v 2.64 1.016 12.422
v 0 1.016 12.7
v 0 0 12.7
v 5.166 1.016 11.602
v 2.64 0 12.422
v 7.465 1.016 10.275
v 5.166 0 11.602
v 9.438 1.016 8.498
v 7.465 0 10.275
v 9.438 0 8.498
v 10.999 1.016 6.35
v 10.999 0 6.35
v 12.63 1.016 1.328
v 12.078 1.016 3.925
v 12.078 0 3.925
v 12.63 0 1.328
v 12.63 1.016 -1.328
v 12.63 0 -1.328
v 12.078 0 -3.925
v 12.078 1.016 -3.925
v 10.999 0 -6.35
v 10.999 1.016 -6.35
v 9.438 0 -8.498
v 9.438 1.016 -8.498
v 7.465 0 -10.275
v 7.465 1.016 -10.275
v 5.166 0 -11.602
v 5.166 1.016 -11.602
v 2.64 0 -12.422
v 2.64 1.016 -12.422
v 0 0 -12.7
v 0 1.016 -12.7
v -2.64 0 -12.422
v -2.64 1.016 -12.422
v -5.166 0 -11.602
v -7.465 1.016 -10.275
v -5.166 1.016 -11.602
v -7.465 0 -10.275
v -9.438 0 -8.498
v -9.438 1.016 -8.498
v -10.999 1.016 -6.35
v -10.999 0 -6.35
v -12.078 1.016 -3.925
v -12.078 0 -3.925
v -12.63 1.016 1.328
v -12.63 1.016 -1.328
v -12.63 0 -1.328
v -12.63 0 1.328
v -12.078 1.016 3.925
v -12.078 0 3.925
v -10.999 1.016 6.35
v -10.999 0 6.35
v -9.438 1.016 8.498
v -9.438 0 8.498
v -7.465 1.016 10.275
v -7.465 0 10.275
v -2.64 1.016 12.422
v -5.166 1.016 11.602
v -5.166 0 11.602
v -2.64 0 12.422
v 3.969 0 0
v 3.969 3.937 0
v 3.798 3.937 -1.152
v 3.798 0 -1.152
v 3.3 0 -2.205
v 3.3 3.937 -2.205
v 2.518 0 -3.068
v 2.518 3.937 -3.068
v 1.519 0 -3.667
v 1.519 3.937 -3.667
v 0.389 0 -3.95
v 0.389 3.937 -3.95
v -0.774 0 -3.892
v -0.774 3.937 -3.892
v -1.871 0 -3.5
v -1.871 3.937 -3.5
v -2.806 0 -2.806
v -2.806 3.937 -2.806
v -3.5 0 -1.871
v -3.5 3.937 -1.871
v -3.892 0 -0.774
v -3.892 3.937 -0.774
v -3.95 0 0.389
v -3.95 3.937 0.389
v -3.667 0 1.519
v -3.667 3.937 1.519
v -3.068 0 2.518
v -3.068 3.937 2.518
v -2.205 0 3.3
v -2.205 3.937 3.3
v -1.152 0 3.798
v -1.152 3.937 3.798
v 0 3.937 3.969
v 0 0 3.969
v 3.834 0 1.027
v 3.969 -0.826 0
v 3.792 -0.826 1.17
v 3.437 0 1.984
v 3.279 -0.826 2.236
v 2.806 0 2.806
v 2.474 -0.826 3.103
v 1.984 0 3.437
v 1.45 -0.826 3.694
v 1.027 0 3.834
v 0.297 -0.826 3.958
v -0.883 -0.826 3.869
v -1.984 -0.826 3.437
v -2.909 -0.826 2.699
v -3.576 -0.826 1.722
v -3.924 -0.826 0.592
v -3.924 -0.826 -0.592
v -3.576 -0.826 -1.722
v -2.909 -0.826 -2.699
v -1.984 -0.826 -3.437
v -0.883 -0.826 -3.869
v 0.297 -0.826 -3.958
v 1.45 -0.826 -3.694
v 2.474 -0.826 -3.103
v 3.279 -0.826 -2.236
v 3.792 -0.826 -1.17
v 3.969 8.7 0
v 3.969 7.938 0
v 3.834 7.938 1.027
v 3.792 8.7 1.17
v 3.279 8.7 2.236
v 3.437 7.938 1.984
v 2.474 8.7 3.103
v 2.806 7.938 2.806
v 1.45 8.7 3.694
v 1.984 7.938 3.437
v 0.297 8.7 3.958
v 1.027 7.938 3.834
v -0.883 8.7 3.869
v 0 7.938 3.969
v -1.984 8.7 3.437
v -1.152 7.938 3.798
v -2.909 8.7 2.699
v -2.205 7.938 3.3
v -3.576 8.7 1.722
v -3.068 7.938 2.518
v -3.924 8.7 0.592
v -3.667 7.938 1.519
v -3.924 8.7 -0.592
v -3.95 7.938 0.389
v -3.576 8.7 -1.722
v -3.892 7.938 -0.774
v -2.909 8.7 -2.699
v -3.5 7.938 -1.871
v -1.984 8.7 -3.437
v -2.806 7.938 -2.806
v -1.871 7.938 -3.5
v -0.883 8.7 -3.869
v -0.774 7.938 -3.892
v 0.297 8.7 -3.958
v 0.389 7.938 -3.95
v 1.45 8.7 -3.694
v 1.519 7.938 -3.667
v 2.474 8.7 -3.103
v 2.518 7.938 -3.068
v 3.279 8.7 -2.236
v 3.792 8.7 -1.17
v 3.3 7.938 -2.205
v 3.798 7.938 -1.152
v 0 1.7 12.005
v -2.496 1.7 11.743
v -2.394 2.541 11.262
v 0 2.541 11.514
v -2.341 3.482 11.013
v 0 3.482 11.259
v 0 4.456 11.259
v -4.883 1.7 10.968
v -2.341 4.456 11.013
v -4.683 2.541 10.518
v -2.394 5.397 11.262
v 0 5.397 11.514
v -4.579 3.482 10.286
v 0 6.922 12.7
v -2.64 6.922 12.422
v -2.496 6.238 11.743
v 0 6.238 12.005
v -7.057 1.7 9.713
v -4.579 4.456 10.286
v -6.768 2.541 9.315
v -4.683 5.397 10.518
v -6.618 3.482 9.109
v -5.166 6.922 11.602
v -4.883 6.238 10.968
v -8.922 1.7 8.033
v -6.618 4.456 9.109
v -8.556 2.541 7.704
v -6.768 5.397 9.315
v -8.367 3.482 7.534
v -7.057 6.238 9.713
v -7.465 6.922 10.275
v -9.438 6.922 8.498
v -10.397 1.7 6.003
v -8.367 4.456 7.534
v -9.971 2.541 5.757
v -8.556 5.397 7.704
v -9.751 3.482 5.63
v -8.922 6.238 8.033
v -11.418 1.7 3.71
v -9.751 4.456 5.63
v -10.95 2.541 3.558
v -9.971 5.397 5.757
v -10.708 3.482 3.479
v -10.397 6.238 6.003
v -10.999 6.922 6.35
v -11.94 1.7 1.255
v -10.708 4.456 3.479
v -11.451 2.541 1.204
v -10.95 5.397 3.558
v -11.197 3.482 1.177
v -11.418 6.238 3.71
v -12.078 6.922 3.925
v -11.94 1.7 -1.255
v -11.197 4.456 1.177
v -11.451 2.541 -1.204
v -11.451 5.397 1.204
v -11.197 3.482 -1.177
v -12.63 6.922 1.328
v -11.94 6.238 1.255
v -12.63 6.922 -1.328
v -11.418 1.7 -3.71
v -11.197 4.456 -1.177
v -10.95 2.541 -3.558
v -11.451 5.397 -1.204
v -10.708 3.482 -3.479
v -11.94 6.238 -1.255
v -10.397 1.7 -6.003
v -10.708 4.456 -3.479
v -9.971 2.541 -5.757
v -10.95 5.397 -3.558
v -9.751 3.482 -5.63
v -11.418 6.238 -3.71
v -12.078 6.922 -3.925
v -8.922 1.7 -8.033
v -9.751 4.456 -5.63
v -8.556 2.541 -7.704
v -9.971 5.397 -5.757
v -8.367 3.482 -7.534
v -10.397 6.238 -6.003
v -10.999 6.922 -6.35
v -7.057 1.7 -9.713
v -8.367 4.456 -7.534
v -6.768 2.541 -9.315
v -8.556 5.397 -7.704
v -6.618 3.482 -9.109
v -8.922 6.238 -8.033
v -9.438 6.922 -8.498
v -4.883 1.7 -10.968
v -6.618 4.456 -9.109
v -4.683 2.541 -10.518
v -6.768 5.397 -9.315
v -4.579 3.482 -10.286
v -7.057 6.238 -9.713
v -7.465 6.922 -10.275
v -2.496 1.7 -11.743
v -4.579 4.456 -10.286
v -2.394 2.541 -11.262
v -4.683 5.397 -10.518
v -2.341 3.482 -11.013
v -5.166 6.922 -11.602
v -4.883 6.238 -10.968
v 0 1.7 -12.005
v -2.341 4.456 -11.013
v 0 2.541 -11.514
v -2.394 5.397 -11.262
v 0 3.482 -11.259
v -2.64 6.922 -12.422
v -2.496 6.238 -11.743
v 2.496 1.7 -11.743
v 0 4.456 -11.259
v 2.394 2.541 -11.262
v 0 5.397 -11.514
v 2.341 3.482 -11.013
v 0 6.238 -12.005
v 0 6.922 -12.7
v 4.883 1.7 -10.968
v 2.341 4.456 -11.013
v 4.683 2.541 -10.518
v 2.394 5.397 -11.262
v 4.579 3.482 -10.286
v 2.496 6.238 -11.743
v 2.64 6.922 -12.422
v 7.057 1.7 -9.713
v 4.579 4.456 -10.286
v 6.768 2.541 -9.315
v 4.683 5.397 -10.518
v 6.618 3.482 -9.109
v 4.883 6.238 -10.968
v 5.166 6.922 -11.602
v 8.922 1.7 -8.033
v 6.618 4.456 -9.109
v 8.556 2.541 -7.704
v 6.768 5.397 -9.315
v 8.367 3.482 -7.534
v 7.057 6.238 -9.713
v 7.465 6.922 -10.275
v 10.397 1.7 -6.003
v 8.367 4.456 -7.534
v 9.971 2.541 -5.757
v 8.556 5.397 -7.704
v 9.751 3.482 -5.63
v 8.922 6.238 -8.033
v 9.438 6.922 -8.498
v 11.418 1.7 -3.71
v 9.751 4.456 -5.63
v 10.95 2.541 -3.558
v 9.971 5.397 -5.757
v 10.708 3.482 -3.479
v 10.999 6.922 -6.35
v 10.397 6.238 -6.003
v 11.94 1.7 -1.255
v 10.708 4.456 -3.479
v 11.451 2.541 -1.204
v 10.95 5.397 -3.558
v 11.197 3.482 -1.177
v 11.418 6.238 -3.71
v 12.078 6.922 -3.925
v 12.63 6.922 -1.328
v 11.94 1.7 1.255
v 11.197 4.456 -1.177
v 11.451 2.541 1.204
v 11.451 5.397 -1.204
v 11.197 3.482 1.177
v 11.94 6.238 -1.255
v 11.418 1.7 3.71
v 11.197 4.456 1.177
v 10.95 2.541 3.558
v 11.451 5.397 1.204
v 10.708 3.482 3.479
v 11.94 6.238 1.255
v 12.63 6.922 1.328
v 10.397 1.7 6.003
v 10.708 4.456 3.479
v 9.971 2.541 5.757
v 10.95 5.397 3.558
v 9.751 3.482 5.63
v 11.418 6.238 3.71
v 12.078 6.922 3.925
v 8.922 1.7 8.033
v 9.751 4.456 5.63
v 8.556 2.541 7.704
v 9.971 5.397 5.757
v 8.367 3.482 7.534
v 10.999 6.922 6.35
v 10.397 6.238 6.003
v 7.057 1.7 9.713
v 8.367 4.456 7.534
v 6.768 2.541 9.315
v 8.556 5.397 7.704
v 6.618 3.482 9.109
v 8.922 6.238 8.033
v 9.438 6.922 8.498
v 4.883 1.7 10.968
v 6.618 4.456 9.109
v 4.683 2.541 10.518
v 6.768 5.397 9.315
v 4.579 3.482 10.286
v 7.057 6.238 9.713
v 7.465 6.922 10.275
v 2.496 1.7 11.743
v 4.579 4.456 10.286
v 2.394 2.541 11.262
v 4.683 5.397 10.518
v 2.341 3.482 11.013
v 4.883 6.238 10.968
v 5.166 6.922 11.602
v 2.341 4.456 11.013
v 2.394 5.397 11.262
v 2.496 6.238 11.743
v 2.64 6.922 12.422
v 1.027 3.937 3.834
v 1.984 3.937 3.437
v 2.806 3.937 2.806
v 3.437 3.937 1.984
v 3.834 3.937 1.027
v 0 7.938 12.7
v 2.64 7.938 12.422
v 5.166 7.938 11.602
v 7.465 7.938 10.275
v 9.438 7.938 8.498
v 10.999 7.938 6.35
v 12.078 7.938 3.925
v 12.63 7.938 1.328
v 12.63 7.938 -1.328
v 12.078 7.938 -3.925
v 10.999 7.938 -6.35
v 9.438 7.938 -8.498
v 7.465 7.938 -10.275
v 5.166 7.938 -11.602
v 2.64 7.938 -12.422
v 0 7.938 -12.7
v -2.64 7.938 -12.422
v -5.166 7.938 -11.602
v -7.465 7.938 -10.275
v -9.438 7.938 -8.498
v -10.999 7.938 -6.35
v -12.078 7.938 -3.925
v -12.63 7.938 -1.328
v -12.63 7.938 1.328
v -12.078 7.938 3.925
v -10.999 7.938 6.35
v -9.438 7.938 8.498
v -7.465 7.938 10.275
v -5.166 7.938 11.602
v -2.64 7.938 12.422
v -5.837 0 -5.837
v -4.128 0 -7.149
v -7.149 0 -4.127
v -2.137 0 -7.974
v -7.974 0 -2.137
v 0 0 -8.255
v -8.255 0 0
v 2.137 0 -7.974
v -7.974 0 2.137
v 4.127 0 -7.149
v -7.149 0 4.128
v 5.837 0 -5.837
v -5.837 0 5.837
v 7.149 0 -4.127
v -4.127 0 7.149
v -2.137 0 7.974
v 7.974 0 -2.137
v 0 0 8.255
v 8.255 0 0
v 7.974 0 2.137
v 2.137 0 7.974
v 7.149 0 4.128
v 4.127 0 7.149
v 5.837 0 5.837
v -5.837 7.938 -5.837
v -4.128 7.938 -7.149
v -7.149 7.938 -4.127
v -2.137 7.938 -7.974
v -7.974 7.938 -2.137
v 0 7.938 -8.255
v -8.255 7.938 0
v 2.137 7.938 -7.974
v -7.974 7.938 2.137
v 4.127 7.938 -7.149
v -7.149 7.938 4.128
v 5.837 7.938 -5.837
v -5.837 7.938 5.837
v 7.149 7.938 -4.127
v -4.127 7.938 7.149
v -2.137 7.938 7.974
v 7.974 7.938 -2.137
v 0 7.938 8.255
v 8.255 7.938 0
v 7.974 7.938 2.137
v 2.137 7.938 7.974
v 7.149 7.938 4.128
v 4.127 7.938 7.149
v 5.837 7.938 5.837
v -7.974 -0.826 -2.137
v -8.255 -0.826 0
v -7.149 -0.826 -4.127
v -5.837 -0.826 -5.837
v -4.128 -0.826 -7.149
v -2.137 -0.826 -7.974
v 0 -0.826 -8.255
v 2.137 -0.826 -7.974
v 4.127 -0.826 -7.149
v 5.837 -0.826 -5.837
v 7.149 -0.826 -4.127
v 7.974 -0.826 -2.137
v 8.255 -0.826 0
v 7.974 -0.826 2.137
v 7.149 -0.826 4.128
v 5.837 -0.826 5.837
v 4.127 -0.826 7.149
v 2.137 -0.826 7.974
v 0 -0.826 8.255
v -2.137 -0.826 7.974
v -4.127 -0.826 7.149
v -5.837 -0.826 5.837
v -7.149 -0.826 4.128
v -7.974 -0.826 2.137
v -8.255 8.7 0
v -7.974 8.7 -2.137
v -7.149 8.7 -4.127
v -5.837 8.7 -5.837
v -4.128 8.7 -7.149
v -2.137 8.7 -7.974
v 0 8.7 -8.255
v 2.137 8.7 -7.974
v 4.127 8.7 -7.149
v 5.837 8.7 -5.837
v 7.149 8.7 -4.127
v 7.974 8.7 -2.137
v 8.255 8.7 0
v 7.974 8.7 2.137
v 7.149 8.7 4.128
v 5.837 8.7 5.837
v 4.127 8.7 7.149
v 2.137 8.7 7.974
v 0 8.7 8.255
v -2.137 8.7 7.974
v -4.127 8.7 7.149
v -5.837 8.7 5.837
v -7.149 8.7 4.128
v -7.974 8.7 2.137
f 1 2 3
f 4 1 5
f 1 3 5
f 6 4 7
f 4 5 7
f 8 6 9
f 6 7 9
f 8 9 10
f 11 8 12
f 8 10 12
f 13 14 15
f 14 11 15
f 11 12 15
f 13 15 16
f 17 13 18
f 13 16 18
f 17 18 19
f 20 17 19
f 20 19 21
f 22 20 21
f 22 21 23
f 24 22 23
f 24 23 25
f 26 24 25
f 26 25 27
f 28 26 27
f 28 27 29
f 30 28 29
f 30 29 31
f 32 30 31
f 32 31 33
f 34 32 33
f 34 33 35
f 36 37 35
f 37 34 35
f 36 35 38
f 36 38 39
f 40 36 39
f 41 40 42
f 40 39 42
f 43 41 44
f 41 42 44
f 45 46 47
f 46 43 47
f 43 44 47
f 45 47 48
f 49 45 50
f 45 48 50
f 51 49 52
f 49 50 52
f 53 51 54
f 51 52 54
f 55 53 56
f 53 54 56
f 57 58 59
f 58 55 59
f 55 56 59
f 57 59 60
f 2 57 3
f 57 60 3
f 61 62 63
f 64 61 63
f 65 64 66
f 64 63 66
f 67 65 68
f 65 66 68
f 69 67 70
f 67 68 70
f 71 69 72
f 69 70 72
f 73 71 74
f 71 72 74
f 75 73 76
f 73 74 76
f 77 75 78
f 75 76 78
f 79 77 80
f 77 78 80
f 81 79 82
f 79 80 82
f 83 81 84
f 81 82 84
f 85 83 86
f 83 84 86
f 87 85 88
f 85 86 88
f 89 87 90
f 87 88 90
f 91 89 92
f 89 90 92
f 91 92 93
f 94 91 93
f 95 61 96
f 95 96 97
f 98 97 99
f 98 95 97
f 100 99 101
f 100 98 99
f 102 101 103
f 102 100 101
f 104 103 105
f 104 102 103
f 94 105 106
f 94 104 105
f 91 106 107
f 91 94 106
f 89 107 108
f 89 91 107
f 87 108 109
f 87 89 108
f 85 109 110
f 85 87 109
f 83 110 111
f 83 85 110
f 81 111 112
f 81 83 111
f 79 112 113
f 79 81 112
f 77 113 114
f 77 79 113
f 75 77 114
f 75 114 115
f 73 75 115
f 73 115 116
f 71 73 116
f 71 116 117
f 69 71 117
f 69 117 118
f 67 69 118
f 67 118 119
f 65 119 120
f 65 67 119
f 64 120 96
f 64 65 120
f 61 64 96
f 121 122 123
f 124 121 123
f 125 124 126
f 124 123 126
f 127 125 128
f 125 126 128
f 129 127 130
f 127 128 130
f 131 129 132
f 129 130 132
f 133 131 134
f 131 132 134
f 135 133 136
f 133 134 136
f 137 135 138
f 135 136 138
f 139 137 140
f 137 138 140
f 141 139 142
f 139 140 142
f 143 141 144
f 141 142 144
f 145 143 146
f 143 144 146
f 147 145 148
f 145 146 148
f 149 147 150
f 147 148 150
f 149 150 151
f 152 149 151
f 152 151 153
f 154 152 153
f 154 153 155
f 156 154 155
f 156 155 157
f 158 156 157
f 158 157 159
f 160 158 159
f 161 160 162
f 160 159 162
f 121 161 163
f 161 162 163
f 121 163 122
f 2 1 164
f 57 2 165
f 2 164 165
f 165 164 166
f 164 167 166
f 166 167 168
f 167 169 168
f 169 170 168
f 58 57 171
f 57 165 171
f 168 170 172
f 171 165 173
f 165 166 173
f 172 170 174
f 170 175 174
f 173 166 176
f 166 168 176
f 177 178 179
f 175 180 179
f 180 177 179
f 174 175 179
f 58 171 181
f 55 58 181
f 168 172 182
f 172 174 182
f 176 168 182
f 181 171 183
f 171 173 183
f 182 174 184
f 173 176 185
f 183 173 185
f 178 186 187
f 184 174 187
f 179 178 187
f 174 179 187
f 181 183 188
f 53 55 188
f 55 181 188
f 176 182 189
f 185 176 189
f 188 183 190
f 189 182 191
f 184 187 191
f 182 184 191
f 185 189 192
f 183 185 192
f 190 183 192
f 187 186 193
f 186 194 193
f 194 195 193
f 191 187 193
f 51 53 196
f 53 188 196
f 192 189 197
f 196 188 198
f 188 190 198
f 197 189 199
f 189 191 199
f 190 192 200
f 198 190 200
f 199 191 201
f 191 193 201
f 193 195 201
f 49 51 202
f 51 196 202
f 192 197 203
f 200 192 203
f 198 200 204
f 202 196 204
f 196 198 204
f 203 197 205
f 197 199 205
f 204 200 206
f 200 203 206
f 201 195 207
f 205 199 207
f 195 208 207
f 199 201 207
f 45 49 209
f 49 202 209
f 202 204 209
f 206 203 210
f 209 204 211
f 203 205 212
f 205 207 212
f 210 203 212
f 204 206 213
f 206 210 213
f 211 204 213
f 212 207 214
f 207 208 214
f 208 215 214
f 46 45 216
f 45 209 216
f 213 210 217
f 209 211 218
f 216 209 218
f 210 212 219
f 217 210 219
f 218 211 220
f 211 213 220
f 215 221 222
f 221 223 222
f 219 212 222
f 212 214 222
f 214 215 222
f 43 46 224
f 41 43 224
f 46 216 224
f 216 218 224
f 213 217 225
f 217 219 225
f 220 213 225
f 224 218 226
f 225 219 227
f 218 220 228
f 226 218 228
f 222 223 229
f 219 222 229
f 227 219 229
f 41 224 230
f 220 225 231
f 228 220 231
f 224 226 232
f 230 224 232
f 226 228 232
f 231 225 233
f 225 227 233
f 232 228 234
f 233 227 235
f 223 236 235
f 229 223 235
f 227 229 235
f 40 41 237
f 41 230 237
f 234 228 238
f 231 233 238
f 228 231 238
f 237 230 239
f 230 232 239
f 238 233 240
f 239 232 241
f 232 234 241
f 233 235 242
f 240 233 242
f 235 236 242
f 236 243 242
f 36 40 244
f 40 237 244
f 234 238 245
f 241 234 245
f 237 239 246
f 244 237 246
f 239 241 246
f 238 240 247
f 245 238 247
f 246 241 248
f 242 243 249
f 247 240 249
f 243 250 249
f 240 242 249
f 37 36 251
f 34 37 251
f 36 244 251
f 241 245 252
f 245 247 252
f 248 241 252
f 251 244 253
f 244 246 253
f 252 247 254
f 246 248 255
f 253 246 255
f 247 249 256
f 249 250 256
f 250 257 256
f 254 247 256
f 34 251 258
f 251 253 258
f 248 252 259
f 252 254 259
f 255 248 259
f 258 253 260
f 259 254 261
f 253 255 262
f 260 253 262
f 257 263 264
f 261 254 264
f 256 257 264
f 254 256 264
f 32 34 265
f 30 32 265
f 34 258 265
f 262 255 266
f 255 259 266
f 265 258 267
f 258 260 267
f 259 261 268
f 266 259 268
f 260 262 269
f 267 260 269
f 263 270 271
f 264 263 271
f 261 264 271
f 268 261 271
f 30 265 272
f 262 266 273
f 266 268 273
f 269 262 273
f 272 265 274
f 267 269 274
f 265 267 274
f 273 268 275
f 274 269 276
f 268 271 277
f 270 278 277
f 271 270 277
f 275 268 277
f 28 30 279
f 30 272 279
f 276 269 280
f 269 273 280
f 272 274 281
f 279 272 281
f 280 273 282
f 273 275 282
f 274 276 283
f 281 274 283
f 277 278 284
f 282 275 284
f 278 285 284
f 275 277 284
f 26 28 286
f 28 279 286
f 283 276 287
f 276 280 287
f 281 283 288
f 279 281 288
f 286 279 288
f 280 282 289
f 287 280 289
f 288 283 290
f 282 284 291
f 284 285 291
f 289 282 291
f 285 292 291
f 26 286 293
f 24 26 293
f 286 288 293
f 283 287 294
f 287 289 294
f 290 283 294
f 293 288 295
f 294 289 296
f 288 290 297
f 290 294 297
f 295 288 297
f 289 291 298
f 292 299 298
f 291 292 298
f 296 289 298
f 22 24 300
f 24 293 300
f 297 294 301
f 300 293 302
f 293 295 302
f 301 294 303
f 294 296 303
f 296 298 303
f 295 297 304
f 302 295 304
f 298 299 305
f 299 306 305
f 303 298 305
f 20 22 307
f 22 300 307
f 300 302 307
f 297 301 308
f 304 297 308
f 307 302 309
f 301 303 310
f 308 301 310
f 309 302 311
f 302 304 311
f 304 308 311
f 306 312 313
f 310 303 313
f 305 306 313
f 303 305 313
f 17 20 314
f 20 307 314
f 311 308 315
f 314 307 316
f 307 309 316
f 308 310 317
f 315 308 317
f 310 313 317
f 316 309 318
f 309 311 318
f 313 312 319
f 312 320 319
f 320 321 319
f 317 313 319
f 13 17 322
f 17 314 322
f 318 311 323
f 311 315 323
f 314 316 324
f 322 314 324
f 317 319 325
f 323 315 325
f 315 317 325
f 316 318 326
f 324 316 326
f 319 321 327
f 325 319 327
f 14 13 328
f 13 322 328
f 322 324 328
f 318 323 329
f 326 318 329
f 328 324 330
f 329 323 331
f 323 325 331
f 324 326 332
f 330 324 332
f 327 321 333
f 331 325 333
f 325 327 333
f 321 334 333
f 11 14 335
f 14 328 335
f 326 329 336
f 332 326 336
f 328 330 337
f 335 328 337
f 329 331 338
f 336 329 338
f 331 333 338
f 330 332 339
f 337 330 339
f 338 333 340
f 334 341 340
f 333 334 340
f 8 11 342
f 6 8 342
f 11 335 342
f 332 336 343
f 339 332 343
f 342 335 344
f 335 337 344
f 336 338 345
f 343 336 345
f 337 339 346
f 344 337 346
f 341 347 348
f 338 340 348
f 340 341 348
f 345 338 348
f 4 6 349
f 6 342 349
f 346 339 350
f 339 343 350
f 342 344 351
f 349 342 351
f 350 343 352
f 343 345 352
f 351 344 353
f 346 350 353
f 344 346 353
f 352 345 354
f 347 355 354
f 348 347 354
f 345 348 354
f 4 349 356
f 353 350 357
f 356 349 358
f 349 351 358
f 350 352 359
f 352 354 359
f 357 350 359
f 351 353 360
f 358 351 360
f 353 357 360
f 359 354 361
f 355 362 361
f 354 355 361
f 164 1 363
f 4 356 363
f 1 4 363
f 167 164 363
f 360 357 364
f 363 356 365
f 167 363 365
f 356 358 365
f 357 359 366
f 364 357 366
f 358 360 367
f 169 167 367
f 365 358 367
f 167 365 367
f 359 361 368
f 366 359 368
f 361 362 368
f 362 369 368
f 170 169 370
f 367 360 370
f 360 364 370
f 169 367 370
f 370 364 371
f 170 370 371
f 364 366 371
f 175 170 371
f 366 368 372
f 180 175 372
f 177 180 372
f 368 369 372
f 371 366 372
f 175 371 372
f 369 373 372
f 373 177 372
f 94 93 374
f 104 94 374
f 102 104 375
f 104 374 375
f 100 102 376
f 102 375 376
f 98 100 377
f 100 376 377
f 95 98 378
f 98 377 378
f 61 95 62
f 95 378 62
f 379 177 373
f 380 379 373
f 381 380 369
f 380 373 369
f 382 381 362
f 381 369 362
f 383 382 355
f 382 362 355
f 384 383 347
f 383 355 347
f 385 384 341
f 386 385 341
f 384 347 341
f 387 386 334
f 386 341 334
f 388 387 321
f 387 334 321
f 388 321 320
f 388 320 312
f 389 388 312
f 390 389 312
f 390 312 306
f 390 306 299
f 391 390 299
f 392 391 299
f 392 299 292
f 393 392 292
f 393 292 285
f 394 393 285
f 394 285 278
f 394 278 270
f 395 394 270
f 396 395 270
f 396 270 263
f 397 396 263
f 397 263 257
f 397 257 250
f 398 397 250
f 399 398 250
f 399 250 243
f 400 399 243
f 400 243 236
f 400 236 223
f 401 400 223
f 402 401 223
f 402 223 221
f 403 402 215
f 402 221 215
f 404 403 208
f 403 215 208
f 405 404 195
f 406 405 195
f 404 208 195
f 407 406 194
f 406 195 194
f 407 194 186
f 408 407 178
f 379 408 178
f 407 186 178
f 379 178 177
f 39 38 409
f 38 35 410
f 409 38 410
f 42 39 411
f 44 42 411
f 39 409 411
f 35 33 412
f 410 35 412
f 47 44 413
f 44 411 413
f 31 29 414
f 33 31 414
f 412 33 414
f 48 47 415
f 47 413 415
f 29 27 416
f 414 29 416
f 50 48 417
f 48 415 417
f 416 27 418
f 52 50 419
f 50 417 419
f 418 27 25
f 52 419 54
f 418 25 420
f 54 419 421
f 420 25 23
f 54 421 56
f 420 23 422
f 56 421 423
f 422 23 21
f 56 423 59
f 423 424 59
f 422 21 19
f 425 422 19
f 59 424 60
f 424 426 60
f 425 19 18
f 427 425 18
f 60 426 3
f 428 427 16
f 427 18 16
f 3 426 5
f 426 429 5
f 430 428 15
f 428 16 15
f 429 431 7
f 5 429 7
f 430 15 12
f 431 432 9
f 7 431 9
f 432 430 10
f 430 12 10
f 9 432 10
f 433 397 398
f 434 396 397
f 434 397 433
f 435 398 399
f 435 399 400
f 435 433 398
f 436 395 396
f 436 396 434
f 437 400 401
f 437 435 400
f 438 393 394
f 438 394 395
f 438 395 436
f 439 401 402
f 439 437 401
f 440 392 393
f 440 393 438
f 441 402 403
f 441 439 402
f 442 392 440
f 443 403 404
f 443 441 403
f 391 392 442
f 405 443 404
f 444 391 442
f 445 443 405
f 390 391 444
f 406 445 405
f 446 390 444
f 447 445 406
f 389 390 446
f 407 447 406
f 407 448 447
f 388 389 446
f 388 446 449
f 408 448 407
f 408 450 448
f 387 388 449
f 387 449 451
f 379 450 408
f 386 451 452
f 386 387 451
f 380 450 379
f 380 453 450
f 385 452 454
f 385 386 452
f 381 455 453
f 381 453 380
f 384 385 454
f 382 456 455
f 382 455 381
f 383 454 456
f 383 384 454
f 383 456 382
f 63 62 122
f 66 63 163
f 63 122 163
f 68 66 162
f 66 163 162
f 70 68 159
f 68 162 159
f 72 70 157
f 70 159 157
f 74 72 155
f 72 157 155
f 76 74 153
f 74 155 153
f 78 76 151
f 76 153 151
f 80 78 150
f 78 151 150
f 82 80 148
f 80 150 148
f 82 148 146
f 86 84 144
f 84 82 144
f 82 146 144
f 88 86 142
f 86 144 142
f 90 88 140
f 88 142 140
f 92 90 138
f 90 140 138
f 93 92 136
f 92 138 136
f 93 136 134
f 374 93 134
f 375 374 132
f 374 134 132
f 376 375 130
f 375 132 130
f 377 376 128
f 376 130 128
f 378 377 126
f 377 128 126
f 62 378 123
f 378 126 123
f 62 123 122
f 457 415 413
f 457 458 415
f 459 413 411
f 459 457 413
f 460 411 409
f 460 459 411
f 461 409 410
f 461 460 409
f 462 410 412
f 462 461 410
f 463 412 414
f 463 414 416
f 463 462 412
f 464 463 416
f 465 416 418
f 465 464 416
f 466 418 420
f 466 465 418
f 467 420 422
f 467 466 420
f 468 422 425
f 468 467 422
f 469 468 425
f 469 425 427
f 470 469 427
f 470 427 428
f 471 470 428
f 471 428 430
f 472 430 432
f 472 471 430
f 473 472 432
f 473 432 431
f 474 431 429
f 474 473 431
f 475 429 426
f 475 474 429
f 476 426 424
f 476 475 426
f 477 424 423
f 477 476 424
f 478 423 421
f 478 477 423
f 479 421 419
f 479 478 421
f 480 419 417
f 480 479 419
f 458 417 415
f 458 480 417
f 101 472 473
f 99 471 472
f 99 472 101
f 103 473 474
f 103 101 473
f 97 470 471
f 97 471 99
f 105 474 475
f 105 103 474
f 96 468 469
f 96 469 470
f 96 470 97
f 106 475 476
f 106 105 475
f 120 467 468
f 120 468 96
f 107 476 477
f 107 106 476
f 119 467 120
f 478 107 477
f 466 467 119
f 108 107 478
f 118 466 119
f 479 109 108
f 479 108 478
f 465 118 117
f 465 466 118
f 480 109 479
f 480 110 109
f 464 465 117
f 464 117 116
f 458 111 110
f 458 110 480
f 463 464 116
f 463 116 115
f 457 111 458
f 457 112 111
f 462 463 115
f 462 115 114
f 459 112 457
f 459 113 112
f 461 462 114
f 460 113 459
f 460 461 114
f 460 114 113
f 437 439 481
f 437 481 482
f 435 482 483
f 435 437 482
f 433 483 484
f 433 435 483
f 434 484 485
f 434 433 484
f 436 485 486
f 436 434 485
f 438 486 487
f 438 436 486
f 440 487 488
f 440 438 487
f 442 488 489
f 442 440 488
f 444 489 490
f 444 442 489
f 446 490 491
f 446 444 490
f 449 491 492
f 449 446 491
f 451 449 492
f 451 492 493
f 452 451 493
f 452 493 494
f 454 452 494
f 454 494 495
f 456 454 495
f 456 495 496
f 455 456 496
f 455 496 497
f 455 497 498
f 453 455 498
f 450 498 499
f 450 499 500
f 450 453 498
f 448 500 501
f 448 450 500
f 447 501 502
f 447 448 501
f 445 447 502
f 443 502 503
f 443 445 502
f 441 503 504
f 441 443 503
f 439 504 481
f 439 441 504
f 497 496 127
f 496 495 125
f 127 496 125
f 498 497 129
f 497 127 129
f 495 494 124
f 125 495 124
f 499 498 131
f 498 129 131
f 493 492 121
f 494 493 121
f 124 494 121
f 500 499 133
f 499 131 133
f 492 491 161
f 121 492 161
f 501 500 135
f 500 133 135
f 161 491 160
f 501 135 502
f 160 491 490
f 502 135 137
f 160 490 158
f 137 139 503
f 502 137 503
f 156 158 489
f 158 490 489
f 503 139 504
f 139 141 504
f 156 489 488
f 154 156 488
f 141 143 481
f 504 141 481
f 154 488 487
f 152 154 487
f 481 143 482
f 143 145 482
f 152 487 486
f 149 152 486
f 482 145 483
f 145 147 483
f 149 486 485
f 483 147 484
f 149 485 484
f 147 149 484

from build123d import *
from build123d.topology import SkipClean

# Parameters (mm, degrees)
SKETCH1_R           = 12.7
BOSS_EXTRUDE1_DEPTH = 7.9375
SKETCH2_R           = 3.96875
CUT_EXTRUDE1_DEPTH  = 20.636290542
SKETCH5_R           = 8.255
SKETCH5_R_2         = 3.96875
BOSS_EXTRUDE2_DEPTH = 4.7625


with BuildPart() as part:
    # Sketch1 → Boss-Extrude1 (new body)
    with BuildSketch(Plane(origin=(0, 0, 0), x_dir=(1, 0, 0), z_dir=(0, 1, 0))):
        with Locations(Location((0, 0, 0), (0, 0, 270))):
            Circle(SKETCH1_R)
    extrude(amount=BOSS_EXTRUDE1_DEPTH)

    # Sketch2 → Cut-Extrude1 (cut, through all)
    with BuildSketch(Plane(origin=(0, 7.9375, 0), x_dir=(1, 0, 0), z_dir=(0, 1, 0))):
        with Locations(Location((0, 0, 0), (0, 0, 270))):
            Circle(SKETCH2_R)
    extrude(amount=-CUT_EXTRUDE1_DEPTH, mode=Mode.SUBTRACT)

    # Sketch4 → Cut-Revolve1 (revolve, cut)
    with BuildSketch(Plane(origin=(0, 0, 0), x_dir=(0, 0, -1), z_dir=(1, 0, 0))):
        with BuildLine():
            Line((-12.7, 6.9215), (-12.7, 1.016))
            ThreePointArc((-12.7, 1.016), (-11.2268, 3.96875), (-12.7, 6.9215))
        make_face()
    revolve(axis=Axis((0, 8.334375, 0), (0, -1, 0)), mode=Mode.SUBTRACT)

    # Sketch5 → Boss-Extrude2 (add, symmetric)
    with SkipClean():  # the faces are left unmerged after this step: merging them gives an invalid solid
        with BuildSketch(Plane(origin=(0, 3.937, 0), x_dir=(-1, 0, 0), z_dir=(0, -1, 0))):
            Circle(SKETCH5_R)
            with Locations(Location((0, 0, 0), (0, 0, 180))):
                Circle(SKETCH5_R_2, mode=Mode.SUBTRACT)
        extrude(amount=BOSS_EXTRUDE2_DEPTH, both=True)


solid = part.part
